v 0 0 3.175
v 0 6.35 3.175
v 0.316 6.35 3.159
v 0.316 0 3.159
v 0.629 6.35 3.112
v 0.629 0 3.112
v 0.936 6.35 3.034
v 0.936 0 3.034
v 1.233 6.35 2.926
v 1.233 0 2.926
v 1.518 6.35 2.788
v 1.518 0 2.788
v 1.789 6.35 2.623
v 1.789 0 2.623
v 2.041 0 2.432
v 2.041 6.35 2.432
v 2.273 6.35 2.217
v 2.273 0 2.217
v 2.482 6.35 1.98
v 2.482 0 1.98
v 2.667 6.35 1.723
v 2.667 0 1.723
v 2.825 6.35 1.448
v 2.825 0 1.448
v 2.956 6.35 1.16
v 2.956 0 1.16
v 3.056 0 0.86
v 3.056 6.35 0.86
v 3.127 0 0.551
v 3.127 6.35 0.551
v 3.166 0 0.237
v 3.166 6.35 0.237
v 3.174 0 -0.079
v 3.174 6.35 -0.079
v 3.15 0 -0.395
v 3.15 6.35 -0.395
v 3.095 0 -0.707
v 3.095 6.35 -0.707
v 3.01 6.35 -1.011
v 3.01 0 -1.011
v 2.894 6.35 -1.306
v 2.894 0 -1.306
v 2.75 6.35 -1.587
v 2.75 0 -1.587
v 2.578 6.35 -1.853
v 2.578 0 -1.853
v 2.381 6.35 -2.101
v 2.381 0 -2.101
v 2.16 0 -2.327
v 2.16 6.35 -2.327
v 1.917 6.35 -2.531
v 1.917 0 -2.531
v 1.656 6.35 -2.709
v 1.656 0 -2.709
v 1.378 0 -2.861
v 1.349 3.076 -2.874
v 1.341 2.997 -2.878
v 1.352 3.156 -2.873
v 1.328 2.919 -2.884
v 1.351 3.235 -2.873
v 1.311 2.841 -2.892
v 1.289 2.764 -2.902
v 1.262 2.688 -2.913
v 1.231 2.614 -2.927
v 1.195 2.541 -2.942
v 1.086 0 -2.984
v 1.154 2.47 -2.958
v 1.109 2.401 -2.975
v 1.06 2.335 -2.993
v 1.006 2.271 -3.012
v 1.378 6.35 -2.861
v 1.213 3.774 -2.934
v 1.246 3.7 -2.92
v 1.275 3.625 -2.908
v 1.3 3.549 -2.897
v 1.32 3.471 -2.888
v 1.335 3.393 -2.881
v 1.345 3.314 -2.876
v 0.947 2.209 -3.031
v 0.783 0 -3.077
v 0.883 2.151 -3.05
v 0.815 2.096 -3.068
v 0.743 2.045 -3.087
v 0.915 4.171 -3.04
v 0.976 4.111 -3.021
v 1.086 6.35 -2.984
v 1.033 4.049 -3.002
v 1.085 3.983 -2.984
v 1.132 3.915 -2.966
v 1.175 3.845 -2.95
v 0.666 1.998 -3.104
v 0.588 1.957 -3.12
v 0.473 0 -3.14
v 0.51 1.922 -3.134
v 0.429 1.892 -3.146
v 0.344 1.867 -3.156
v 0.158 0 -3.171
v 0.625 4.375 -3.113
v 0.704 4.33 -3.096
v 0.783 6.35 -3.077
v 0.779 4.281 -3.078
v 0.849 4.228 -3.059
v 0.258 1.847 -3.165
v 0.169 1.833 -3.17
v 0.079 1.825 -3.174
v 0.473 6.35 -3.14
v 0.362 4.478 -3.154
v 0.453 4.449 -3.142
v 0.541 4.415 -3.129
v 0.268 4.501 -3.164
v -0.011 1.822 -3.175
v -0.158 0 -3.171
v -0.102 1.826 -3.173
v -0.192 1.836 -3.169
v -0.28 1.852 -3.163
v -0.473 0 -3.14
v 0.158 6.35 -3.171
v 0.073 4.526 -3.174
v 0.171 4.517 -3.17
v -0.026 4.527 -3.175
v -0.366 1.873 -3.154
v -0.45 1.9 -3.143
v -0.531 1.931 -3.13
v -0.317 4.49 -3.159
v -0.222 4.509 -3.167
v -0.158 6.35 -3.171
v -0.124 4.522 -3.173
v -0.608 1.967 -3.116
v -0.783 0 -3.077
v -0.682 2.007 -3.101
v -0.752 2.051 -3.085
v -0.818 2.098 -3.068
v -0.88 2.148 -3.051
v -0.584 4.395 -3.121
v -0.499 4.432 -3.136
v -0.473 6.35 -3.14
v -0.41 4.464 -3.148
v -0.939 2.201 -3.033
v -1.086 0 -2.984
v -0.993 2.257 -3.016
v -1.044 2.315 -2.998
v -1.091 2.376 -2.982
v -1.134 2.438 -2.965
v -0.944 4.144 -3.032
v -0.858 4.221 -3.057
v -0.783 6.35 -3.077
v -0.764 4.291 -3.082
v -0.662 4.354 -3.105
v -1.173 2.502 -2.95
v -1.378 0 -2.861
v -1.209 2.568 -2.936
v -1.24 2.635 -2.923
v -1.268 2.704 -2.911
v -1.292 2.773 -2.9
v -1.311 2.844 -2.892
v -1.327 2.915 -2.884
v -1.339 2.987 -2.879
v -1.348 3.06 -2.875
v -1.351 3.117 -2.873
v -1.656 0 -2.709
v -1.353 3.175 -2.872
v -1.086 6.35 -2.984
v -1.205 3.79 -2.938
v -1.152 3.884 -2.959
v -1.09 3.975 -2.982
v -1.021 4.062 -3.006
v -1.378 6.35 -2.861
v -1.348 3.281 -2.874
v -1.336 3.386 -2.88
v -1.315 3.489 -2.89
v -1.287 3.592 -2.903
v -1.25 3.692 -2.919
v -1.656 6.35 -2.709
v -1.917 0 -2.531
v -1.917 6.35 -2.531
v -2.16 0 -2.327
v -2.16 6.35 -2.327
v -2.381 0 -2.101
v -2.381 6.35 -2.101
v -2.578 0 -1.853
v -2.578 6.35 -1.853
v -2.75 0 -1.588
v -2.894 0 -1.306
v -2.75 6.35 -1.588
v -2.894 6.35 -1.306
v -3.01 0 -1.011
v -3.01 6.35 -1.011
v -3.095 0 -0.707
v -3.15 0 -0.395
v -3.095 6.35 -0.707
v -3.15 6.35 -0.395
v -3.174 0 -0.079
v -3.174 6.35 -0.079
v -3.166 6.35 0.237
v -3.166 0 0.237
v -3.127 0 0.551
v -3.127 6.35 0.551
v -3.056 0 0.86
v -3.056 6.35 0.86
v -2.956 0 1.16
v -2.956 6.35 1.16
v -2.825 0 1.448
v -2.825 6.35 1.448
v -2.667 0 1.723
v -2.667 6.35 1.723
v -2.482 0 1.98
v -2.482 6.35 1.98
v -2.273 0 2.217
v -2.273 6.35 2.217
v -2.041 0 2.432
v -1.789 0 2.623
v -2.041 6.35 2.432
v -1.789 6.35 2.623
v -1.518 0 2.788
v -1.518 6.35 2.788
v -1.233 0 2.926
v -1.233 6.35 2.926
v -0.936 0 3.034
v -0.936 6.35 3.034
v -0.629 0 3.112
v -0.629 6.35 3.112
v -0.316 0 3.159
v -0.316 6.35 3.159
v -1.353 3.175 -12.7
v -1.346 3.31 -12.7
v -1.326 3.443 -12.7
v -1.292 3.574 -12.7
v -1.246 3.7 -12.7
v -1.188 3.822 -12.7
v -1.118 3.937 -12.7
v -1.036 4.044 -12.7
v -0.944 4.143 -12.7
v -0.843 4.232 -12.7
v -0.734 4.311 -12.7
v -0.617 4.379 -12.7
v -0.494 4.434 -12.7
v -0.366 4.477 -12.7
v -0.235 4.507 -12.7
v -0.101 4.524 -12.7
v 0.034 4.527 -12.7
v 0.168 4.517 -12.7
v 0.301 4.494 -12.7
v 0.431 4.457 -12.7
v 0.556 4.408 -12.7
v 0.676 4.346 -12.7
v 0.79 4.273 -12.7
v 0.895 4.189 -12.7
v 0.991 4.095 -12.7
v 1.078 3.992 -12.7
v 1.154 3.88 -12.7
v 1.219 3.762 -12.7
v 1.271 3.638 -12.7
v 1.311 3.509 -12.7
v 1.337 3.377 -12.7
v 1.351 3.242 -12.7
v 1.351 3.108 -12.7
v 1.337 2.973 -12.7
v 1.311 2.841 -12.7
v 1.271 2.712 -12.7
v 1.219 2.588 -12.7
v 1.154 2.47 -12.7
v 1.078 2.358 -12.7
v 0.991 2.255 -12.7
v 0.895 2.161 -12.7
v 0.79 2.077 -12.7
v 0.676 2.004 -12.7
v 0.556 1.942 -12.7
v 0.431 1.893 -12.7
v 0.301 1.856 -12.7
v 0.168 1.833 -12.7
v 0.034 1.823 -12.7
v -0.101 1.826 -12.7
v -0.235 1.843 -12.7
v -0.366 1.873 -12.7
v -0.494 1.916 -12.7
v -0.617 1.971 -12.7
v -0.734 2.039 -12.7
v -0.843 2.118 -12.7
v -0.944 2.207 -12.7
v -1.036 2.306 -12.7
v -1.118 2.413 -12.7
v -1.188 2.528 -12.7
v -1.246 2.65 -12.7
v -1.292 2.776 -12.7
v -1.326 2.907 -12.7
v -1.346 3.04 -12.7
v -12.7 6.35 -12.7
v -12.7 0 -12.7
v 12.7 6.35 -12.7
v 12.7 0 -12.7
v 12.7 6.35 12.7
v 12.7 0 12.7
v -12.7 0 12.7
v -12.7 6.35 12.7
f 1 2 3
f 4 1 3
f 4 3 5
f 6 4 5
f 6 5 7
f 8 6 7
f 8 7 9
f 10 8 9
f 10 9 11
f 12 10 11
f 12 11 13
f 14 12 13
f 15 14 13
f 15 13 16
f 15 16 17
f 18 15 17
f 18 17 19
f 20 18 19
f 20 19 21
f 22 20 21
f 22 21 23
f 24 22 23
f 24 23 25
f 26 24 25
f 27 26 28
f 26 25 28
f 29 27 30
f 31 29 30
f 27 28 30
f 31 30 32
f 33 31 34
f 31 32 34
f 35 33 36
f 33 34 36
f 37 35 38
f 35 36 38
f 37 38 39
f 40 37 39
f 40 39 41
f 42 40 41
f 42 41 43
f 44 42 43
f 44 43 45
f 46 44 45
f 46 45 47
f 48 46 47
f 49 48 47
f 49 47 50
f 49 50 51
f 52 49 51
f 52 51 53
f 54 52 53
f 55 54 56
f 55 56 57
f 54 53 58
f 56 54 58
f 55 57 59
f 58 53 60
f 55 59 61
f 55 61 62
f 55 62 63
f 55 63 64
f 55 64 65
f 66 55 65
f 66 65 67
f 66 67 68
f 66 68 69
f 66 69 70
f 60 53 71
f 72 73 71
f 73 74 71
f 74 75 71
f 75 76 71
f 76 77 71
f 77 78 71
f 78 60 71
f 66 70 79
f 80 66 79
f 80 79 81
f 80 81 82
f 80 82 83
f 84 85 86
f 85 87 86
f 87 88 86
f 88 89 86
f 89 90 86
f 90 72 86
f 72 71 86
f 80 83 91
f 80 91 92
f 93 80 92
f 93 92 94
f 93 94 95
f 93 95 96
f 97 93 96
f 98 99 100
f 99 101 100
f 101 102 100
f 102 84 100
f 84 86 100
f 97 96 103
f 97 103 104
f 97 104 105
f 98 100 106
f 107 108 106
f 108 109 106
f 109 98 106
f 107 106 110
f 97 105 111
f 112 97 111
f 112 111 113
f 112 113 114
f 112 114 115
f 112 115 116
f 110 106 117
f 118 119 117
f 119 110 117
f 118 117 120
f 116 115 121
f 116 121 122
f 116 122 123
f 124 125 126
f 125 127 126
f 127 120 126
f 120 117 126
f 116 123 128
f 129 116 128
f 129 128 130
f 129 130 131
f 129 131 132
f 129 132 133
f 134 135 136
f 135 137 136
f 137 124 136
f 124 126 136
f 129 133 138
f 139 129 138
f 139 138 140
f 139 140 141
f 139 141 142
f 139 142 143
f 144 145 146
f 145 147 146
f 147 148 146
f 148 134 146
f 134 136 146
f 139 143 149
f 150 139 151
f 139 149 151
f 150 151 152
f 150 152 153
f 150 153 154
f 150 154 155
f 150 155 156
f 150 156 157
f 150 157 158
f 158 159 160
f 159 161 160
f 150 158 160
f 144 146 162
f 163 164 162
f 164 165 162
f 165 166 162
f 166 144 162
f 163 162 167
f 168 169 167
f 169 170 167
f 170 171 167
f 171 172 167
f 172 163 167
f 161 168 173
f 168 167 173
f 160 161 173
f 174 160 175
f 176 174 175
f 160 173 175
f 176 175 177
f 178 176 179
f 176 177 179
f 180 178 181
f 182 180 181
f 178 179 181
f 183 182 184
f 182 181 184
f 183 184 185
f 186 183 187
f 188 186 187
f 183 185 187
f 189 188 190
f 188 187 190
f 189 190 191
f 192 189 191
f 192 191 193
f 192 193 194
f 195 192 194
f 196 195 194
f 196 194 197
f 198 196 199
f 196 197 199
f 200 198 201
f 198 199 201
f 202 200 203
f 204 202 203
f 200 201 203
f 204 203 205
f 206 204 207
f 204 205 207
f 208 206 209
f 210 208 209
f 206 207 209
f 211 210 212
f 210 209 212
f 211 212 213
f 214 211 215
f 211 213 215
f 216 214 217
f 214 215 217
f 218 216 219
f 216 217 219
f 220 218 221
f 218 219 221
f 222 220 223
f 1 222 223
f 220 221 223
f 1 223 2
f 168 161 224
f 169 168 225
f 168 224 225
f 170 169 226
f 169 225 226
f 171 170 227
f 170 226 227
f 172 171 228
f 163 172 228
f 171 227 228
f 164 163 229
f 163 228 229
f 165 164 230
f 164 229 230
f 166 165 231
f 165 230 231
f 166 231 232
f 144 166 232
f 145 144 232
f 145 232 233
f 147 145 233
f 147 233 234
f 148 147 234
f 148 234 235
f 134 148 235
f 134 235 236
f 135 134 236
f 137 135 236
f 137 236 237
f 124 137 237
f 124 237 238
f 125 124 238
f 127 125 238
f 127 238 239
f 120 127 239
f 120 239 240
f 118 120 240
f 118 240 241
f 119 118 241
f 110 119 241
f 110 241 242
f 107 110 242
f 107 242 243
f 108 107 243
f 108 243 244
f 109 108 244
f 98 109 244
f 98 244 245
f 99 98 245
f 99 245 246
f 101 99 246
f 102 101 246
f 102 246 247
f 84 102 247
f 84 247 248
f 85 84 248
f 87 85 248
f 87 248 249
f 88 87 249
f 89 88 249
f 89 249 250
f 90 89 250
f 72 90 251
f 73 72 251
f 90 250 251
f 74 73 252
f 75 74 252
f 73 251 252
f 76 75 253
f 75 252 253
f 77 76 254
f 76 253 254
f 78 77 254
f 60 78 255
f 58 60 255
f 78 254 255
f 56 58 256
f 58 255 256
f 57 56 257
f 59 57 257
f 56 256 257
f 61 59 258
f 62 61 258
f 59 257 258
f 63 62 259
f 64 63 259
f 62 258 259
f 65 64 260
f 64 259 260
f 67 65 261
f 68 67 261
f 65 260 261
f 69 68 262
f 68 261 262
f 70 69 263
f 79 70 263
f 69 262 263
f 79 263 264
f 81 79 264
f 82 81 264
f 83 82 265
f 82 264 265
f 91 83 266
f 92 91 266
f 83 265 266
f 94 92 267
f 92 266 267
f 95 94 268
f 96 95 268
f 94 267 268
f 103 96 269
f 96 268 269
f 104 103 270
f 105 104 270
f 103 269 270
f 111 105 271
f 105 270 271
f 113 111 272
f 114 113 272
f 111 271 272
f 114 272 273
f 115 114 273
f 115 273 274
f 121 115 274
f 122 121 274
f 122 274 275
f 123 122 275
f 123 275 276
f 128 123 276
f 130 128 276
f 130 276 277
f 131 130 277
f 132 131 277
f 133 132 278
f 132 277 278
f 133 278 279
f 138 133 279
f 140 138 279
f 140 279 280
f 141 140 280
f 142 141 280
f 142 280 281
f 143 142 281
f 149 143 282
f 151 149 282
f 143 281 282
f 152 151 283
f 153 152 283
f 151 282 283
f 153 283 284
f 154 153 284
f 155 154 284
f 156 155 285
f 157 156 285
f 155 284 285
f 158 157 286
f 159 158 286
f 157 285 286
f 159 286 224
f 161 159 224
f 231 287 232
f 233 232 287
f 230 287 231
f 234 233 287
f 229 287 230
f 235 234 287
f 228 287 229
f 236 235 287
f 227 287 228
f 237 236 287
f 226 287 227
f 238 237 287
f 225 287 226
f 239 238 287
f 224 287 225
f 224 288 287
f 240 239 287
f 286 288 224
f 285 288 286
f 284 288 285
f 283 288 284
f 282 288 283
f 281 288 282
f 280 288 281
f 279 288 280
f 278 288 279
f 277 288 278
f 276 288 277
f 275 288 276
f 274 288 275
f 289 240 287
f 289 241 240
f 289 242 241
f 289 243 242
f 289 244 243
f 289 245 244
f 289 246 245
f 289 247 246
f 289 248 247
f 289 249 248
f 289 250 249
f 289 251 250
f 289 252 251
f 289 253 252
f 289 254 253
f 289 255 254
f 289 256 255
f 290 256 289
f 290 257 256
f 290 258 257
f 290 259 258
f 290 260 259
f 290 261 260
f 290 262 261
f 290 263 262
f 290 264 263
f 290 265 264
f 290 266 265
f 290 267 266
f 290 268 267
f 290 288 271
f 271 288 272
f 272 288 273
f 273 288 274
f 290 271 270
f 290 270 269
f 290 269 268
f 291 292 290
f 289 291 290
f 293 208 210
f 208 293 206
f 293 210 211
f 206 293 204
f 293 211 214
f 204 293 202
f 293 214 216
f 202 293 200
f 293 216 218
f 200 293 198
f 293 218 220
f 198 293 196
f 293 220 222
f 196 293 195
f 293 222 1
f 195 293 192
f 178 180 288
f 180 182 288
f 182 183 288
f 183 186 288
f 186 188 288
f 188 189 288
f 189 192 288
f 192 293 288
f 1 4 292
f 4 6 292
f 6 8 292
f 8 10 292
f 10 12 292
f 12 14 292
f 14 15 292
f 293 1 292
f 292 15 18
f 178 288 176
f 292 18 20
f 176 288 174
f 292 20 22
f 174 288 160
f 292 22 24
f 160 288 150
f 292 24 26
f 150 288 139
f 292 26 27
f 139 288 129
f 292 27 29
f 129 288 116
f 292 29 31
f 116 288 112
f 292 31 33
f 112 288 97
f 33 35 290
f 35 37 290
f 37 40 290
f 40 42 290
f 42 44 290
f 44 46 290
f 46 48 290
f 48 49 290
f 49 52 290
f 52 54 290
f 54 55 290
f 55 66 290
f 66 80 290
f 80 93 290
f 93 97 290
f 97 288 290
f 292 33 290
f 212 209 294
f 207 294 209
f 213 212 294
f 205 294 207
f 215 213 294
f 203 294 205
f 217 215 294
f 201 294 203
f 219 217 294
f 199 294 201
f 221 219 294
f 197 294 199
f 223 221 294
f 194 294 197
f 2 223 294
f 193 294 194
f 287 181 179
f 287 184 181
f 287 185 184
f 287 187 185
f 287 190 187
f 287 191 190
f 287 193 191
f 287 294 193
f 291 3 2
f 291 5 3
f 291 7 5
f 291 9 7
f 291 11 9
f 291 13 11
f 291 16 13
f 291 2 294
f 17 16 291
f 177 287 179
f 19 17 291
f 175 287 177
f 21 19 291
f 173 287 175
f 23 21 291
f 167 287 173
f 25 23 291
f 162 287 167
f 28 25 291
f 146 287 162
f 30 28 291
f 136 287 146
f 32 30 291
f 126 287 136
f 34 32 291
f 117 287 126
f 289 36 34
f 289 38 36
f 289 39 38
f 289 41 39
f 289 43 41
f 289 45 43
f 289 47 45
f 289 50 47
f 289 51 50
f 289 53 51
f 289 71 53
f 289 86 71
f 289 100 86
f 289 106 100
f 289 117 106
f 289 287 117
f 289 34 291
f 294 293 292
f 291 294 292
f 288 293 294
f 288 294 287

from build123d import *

# Parameters (mm, degrees)
SKETCH1_W                  = 25.4
SKETCH1_H                  = 25.4
BOSS_EXTRUDE1_DEPTH        = 6.35
SKETCH2_R                  = 3.175
CUT_EXTRUDE1_DEPTH         = 20.05
F_6_32_TAPPED_HOLE1_REACH  = 31.099
F_6_32_TAPPED_HOLE1_BORE_R = 1.35255


with BuildPart() as part:
    # Sketch1 → Boss-Extrude1 (new body)
    with BuildSketch(Plane(origin=(0, 0, 0), x_dir=(1, 0, 0), z_dir=(0, 1, 0))):
        Rectangle(SKETCH1_W, SKETCH1_H)
    extrude(amount=BOSS_EXTRUDE1_DEPTH)

    # Sketch2 → Cut-Extrude1 (cut, through all)
    with BuildSketch(Plane(origin=(0, 6.35, 0), x_dir=(1, 0, 0), z_dir=(0, 1, 0))):
        with Locations(Location((0, 0, 0), (0, 0, 270))):
            Circle(SKETCH2_R)
    extrude(amount=-CUT_EXTRUDE1_DEPTH, mode=Mode.SUBTRACT)

    # #6-32 Tapped Hole1 bore → #6-32 Tapped Hole1 (cut, up to next)
    with BuildSketch(Plane(origin=(0, 0, -12.7), x_dir=(-1, 0, 0), z_dir=(0, 0, -1)), mode=Mode.PRIVATE) as f_6_32_tapped_hole1_sk1:
        with Locations((0, 3.175)):
            Circle(F_6_32_TAPPED_HOLE1_BORE_R)
    f_6_32_tapped_hole1_tool1 = extrude(f_6_32_tapped_hole1_sk1.sketch, amount=-F_6_32_TAPPED_HOLE1_REACH, mode=Mode.PRIVATE) & part.part
    add(f_6_32_tapped_hole1_tool1.solids().sort_by_distance((0, 3.175, -12.7))[0], mode=Mode.SUBTRACT)


solid = part.part
